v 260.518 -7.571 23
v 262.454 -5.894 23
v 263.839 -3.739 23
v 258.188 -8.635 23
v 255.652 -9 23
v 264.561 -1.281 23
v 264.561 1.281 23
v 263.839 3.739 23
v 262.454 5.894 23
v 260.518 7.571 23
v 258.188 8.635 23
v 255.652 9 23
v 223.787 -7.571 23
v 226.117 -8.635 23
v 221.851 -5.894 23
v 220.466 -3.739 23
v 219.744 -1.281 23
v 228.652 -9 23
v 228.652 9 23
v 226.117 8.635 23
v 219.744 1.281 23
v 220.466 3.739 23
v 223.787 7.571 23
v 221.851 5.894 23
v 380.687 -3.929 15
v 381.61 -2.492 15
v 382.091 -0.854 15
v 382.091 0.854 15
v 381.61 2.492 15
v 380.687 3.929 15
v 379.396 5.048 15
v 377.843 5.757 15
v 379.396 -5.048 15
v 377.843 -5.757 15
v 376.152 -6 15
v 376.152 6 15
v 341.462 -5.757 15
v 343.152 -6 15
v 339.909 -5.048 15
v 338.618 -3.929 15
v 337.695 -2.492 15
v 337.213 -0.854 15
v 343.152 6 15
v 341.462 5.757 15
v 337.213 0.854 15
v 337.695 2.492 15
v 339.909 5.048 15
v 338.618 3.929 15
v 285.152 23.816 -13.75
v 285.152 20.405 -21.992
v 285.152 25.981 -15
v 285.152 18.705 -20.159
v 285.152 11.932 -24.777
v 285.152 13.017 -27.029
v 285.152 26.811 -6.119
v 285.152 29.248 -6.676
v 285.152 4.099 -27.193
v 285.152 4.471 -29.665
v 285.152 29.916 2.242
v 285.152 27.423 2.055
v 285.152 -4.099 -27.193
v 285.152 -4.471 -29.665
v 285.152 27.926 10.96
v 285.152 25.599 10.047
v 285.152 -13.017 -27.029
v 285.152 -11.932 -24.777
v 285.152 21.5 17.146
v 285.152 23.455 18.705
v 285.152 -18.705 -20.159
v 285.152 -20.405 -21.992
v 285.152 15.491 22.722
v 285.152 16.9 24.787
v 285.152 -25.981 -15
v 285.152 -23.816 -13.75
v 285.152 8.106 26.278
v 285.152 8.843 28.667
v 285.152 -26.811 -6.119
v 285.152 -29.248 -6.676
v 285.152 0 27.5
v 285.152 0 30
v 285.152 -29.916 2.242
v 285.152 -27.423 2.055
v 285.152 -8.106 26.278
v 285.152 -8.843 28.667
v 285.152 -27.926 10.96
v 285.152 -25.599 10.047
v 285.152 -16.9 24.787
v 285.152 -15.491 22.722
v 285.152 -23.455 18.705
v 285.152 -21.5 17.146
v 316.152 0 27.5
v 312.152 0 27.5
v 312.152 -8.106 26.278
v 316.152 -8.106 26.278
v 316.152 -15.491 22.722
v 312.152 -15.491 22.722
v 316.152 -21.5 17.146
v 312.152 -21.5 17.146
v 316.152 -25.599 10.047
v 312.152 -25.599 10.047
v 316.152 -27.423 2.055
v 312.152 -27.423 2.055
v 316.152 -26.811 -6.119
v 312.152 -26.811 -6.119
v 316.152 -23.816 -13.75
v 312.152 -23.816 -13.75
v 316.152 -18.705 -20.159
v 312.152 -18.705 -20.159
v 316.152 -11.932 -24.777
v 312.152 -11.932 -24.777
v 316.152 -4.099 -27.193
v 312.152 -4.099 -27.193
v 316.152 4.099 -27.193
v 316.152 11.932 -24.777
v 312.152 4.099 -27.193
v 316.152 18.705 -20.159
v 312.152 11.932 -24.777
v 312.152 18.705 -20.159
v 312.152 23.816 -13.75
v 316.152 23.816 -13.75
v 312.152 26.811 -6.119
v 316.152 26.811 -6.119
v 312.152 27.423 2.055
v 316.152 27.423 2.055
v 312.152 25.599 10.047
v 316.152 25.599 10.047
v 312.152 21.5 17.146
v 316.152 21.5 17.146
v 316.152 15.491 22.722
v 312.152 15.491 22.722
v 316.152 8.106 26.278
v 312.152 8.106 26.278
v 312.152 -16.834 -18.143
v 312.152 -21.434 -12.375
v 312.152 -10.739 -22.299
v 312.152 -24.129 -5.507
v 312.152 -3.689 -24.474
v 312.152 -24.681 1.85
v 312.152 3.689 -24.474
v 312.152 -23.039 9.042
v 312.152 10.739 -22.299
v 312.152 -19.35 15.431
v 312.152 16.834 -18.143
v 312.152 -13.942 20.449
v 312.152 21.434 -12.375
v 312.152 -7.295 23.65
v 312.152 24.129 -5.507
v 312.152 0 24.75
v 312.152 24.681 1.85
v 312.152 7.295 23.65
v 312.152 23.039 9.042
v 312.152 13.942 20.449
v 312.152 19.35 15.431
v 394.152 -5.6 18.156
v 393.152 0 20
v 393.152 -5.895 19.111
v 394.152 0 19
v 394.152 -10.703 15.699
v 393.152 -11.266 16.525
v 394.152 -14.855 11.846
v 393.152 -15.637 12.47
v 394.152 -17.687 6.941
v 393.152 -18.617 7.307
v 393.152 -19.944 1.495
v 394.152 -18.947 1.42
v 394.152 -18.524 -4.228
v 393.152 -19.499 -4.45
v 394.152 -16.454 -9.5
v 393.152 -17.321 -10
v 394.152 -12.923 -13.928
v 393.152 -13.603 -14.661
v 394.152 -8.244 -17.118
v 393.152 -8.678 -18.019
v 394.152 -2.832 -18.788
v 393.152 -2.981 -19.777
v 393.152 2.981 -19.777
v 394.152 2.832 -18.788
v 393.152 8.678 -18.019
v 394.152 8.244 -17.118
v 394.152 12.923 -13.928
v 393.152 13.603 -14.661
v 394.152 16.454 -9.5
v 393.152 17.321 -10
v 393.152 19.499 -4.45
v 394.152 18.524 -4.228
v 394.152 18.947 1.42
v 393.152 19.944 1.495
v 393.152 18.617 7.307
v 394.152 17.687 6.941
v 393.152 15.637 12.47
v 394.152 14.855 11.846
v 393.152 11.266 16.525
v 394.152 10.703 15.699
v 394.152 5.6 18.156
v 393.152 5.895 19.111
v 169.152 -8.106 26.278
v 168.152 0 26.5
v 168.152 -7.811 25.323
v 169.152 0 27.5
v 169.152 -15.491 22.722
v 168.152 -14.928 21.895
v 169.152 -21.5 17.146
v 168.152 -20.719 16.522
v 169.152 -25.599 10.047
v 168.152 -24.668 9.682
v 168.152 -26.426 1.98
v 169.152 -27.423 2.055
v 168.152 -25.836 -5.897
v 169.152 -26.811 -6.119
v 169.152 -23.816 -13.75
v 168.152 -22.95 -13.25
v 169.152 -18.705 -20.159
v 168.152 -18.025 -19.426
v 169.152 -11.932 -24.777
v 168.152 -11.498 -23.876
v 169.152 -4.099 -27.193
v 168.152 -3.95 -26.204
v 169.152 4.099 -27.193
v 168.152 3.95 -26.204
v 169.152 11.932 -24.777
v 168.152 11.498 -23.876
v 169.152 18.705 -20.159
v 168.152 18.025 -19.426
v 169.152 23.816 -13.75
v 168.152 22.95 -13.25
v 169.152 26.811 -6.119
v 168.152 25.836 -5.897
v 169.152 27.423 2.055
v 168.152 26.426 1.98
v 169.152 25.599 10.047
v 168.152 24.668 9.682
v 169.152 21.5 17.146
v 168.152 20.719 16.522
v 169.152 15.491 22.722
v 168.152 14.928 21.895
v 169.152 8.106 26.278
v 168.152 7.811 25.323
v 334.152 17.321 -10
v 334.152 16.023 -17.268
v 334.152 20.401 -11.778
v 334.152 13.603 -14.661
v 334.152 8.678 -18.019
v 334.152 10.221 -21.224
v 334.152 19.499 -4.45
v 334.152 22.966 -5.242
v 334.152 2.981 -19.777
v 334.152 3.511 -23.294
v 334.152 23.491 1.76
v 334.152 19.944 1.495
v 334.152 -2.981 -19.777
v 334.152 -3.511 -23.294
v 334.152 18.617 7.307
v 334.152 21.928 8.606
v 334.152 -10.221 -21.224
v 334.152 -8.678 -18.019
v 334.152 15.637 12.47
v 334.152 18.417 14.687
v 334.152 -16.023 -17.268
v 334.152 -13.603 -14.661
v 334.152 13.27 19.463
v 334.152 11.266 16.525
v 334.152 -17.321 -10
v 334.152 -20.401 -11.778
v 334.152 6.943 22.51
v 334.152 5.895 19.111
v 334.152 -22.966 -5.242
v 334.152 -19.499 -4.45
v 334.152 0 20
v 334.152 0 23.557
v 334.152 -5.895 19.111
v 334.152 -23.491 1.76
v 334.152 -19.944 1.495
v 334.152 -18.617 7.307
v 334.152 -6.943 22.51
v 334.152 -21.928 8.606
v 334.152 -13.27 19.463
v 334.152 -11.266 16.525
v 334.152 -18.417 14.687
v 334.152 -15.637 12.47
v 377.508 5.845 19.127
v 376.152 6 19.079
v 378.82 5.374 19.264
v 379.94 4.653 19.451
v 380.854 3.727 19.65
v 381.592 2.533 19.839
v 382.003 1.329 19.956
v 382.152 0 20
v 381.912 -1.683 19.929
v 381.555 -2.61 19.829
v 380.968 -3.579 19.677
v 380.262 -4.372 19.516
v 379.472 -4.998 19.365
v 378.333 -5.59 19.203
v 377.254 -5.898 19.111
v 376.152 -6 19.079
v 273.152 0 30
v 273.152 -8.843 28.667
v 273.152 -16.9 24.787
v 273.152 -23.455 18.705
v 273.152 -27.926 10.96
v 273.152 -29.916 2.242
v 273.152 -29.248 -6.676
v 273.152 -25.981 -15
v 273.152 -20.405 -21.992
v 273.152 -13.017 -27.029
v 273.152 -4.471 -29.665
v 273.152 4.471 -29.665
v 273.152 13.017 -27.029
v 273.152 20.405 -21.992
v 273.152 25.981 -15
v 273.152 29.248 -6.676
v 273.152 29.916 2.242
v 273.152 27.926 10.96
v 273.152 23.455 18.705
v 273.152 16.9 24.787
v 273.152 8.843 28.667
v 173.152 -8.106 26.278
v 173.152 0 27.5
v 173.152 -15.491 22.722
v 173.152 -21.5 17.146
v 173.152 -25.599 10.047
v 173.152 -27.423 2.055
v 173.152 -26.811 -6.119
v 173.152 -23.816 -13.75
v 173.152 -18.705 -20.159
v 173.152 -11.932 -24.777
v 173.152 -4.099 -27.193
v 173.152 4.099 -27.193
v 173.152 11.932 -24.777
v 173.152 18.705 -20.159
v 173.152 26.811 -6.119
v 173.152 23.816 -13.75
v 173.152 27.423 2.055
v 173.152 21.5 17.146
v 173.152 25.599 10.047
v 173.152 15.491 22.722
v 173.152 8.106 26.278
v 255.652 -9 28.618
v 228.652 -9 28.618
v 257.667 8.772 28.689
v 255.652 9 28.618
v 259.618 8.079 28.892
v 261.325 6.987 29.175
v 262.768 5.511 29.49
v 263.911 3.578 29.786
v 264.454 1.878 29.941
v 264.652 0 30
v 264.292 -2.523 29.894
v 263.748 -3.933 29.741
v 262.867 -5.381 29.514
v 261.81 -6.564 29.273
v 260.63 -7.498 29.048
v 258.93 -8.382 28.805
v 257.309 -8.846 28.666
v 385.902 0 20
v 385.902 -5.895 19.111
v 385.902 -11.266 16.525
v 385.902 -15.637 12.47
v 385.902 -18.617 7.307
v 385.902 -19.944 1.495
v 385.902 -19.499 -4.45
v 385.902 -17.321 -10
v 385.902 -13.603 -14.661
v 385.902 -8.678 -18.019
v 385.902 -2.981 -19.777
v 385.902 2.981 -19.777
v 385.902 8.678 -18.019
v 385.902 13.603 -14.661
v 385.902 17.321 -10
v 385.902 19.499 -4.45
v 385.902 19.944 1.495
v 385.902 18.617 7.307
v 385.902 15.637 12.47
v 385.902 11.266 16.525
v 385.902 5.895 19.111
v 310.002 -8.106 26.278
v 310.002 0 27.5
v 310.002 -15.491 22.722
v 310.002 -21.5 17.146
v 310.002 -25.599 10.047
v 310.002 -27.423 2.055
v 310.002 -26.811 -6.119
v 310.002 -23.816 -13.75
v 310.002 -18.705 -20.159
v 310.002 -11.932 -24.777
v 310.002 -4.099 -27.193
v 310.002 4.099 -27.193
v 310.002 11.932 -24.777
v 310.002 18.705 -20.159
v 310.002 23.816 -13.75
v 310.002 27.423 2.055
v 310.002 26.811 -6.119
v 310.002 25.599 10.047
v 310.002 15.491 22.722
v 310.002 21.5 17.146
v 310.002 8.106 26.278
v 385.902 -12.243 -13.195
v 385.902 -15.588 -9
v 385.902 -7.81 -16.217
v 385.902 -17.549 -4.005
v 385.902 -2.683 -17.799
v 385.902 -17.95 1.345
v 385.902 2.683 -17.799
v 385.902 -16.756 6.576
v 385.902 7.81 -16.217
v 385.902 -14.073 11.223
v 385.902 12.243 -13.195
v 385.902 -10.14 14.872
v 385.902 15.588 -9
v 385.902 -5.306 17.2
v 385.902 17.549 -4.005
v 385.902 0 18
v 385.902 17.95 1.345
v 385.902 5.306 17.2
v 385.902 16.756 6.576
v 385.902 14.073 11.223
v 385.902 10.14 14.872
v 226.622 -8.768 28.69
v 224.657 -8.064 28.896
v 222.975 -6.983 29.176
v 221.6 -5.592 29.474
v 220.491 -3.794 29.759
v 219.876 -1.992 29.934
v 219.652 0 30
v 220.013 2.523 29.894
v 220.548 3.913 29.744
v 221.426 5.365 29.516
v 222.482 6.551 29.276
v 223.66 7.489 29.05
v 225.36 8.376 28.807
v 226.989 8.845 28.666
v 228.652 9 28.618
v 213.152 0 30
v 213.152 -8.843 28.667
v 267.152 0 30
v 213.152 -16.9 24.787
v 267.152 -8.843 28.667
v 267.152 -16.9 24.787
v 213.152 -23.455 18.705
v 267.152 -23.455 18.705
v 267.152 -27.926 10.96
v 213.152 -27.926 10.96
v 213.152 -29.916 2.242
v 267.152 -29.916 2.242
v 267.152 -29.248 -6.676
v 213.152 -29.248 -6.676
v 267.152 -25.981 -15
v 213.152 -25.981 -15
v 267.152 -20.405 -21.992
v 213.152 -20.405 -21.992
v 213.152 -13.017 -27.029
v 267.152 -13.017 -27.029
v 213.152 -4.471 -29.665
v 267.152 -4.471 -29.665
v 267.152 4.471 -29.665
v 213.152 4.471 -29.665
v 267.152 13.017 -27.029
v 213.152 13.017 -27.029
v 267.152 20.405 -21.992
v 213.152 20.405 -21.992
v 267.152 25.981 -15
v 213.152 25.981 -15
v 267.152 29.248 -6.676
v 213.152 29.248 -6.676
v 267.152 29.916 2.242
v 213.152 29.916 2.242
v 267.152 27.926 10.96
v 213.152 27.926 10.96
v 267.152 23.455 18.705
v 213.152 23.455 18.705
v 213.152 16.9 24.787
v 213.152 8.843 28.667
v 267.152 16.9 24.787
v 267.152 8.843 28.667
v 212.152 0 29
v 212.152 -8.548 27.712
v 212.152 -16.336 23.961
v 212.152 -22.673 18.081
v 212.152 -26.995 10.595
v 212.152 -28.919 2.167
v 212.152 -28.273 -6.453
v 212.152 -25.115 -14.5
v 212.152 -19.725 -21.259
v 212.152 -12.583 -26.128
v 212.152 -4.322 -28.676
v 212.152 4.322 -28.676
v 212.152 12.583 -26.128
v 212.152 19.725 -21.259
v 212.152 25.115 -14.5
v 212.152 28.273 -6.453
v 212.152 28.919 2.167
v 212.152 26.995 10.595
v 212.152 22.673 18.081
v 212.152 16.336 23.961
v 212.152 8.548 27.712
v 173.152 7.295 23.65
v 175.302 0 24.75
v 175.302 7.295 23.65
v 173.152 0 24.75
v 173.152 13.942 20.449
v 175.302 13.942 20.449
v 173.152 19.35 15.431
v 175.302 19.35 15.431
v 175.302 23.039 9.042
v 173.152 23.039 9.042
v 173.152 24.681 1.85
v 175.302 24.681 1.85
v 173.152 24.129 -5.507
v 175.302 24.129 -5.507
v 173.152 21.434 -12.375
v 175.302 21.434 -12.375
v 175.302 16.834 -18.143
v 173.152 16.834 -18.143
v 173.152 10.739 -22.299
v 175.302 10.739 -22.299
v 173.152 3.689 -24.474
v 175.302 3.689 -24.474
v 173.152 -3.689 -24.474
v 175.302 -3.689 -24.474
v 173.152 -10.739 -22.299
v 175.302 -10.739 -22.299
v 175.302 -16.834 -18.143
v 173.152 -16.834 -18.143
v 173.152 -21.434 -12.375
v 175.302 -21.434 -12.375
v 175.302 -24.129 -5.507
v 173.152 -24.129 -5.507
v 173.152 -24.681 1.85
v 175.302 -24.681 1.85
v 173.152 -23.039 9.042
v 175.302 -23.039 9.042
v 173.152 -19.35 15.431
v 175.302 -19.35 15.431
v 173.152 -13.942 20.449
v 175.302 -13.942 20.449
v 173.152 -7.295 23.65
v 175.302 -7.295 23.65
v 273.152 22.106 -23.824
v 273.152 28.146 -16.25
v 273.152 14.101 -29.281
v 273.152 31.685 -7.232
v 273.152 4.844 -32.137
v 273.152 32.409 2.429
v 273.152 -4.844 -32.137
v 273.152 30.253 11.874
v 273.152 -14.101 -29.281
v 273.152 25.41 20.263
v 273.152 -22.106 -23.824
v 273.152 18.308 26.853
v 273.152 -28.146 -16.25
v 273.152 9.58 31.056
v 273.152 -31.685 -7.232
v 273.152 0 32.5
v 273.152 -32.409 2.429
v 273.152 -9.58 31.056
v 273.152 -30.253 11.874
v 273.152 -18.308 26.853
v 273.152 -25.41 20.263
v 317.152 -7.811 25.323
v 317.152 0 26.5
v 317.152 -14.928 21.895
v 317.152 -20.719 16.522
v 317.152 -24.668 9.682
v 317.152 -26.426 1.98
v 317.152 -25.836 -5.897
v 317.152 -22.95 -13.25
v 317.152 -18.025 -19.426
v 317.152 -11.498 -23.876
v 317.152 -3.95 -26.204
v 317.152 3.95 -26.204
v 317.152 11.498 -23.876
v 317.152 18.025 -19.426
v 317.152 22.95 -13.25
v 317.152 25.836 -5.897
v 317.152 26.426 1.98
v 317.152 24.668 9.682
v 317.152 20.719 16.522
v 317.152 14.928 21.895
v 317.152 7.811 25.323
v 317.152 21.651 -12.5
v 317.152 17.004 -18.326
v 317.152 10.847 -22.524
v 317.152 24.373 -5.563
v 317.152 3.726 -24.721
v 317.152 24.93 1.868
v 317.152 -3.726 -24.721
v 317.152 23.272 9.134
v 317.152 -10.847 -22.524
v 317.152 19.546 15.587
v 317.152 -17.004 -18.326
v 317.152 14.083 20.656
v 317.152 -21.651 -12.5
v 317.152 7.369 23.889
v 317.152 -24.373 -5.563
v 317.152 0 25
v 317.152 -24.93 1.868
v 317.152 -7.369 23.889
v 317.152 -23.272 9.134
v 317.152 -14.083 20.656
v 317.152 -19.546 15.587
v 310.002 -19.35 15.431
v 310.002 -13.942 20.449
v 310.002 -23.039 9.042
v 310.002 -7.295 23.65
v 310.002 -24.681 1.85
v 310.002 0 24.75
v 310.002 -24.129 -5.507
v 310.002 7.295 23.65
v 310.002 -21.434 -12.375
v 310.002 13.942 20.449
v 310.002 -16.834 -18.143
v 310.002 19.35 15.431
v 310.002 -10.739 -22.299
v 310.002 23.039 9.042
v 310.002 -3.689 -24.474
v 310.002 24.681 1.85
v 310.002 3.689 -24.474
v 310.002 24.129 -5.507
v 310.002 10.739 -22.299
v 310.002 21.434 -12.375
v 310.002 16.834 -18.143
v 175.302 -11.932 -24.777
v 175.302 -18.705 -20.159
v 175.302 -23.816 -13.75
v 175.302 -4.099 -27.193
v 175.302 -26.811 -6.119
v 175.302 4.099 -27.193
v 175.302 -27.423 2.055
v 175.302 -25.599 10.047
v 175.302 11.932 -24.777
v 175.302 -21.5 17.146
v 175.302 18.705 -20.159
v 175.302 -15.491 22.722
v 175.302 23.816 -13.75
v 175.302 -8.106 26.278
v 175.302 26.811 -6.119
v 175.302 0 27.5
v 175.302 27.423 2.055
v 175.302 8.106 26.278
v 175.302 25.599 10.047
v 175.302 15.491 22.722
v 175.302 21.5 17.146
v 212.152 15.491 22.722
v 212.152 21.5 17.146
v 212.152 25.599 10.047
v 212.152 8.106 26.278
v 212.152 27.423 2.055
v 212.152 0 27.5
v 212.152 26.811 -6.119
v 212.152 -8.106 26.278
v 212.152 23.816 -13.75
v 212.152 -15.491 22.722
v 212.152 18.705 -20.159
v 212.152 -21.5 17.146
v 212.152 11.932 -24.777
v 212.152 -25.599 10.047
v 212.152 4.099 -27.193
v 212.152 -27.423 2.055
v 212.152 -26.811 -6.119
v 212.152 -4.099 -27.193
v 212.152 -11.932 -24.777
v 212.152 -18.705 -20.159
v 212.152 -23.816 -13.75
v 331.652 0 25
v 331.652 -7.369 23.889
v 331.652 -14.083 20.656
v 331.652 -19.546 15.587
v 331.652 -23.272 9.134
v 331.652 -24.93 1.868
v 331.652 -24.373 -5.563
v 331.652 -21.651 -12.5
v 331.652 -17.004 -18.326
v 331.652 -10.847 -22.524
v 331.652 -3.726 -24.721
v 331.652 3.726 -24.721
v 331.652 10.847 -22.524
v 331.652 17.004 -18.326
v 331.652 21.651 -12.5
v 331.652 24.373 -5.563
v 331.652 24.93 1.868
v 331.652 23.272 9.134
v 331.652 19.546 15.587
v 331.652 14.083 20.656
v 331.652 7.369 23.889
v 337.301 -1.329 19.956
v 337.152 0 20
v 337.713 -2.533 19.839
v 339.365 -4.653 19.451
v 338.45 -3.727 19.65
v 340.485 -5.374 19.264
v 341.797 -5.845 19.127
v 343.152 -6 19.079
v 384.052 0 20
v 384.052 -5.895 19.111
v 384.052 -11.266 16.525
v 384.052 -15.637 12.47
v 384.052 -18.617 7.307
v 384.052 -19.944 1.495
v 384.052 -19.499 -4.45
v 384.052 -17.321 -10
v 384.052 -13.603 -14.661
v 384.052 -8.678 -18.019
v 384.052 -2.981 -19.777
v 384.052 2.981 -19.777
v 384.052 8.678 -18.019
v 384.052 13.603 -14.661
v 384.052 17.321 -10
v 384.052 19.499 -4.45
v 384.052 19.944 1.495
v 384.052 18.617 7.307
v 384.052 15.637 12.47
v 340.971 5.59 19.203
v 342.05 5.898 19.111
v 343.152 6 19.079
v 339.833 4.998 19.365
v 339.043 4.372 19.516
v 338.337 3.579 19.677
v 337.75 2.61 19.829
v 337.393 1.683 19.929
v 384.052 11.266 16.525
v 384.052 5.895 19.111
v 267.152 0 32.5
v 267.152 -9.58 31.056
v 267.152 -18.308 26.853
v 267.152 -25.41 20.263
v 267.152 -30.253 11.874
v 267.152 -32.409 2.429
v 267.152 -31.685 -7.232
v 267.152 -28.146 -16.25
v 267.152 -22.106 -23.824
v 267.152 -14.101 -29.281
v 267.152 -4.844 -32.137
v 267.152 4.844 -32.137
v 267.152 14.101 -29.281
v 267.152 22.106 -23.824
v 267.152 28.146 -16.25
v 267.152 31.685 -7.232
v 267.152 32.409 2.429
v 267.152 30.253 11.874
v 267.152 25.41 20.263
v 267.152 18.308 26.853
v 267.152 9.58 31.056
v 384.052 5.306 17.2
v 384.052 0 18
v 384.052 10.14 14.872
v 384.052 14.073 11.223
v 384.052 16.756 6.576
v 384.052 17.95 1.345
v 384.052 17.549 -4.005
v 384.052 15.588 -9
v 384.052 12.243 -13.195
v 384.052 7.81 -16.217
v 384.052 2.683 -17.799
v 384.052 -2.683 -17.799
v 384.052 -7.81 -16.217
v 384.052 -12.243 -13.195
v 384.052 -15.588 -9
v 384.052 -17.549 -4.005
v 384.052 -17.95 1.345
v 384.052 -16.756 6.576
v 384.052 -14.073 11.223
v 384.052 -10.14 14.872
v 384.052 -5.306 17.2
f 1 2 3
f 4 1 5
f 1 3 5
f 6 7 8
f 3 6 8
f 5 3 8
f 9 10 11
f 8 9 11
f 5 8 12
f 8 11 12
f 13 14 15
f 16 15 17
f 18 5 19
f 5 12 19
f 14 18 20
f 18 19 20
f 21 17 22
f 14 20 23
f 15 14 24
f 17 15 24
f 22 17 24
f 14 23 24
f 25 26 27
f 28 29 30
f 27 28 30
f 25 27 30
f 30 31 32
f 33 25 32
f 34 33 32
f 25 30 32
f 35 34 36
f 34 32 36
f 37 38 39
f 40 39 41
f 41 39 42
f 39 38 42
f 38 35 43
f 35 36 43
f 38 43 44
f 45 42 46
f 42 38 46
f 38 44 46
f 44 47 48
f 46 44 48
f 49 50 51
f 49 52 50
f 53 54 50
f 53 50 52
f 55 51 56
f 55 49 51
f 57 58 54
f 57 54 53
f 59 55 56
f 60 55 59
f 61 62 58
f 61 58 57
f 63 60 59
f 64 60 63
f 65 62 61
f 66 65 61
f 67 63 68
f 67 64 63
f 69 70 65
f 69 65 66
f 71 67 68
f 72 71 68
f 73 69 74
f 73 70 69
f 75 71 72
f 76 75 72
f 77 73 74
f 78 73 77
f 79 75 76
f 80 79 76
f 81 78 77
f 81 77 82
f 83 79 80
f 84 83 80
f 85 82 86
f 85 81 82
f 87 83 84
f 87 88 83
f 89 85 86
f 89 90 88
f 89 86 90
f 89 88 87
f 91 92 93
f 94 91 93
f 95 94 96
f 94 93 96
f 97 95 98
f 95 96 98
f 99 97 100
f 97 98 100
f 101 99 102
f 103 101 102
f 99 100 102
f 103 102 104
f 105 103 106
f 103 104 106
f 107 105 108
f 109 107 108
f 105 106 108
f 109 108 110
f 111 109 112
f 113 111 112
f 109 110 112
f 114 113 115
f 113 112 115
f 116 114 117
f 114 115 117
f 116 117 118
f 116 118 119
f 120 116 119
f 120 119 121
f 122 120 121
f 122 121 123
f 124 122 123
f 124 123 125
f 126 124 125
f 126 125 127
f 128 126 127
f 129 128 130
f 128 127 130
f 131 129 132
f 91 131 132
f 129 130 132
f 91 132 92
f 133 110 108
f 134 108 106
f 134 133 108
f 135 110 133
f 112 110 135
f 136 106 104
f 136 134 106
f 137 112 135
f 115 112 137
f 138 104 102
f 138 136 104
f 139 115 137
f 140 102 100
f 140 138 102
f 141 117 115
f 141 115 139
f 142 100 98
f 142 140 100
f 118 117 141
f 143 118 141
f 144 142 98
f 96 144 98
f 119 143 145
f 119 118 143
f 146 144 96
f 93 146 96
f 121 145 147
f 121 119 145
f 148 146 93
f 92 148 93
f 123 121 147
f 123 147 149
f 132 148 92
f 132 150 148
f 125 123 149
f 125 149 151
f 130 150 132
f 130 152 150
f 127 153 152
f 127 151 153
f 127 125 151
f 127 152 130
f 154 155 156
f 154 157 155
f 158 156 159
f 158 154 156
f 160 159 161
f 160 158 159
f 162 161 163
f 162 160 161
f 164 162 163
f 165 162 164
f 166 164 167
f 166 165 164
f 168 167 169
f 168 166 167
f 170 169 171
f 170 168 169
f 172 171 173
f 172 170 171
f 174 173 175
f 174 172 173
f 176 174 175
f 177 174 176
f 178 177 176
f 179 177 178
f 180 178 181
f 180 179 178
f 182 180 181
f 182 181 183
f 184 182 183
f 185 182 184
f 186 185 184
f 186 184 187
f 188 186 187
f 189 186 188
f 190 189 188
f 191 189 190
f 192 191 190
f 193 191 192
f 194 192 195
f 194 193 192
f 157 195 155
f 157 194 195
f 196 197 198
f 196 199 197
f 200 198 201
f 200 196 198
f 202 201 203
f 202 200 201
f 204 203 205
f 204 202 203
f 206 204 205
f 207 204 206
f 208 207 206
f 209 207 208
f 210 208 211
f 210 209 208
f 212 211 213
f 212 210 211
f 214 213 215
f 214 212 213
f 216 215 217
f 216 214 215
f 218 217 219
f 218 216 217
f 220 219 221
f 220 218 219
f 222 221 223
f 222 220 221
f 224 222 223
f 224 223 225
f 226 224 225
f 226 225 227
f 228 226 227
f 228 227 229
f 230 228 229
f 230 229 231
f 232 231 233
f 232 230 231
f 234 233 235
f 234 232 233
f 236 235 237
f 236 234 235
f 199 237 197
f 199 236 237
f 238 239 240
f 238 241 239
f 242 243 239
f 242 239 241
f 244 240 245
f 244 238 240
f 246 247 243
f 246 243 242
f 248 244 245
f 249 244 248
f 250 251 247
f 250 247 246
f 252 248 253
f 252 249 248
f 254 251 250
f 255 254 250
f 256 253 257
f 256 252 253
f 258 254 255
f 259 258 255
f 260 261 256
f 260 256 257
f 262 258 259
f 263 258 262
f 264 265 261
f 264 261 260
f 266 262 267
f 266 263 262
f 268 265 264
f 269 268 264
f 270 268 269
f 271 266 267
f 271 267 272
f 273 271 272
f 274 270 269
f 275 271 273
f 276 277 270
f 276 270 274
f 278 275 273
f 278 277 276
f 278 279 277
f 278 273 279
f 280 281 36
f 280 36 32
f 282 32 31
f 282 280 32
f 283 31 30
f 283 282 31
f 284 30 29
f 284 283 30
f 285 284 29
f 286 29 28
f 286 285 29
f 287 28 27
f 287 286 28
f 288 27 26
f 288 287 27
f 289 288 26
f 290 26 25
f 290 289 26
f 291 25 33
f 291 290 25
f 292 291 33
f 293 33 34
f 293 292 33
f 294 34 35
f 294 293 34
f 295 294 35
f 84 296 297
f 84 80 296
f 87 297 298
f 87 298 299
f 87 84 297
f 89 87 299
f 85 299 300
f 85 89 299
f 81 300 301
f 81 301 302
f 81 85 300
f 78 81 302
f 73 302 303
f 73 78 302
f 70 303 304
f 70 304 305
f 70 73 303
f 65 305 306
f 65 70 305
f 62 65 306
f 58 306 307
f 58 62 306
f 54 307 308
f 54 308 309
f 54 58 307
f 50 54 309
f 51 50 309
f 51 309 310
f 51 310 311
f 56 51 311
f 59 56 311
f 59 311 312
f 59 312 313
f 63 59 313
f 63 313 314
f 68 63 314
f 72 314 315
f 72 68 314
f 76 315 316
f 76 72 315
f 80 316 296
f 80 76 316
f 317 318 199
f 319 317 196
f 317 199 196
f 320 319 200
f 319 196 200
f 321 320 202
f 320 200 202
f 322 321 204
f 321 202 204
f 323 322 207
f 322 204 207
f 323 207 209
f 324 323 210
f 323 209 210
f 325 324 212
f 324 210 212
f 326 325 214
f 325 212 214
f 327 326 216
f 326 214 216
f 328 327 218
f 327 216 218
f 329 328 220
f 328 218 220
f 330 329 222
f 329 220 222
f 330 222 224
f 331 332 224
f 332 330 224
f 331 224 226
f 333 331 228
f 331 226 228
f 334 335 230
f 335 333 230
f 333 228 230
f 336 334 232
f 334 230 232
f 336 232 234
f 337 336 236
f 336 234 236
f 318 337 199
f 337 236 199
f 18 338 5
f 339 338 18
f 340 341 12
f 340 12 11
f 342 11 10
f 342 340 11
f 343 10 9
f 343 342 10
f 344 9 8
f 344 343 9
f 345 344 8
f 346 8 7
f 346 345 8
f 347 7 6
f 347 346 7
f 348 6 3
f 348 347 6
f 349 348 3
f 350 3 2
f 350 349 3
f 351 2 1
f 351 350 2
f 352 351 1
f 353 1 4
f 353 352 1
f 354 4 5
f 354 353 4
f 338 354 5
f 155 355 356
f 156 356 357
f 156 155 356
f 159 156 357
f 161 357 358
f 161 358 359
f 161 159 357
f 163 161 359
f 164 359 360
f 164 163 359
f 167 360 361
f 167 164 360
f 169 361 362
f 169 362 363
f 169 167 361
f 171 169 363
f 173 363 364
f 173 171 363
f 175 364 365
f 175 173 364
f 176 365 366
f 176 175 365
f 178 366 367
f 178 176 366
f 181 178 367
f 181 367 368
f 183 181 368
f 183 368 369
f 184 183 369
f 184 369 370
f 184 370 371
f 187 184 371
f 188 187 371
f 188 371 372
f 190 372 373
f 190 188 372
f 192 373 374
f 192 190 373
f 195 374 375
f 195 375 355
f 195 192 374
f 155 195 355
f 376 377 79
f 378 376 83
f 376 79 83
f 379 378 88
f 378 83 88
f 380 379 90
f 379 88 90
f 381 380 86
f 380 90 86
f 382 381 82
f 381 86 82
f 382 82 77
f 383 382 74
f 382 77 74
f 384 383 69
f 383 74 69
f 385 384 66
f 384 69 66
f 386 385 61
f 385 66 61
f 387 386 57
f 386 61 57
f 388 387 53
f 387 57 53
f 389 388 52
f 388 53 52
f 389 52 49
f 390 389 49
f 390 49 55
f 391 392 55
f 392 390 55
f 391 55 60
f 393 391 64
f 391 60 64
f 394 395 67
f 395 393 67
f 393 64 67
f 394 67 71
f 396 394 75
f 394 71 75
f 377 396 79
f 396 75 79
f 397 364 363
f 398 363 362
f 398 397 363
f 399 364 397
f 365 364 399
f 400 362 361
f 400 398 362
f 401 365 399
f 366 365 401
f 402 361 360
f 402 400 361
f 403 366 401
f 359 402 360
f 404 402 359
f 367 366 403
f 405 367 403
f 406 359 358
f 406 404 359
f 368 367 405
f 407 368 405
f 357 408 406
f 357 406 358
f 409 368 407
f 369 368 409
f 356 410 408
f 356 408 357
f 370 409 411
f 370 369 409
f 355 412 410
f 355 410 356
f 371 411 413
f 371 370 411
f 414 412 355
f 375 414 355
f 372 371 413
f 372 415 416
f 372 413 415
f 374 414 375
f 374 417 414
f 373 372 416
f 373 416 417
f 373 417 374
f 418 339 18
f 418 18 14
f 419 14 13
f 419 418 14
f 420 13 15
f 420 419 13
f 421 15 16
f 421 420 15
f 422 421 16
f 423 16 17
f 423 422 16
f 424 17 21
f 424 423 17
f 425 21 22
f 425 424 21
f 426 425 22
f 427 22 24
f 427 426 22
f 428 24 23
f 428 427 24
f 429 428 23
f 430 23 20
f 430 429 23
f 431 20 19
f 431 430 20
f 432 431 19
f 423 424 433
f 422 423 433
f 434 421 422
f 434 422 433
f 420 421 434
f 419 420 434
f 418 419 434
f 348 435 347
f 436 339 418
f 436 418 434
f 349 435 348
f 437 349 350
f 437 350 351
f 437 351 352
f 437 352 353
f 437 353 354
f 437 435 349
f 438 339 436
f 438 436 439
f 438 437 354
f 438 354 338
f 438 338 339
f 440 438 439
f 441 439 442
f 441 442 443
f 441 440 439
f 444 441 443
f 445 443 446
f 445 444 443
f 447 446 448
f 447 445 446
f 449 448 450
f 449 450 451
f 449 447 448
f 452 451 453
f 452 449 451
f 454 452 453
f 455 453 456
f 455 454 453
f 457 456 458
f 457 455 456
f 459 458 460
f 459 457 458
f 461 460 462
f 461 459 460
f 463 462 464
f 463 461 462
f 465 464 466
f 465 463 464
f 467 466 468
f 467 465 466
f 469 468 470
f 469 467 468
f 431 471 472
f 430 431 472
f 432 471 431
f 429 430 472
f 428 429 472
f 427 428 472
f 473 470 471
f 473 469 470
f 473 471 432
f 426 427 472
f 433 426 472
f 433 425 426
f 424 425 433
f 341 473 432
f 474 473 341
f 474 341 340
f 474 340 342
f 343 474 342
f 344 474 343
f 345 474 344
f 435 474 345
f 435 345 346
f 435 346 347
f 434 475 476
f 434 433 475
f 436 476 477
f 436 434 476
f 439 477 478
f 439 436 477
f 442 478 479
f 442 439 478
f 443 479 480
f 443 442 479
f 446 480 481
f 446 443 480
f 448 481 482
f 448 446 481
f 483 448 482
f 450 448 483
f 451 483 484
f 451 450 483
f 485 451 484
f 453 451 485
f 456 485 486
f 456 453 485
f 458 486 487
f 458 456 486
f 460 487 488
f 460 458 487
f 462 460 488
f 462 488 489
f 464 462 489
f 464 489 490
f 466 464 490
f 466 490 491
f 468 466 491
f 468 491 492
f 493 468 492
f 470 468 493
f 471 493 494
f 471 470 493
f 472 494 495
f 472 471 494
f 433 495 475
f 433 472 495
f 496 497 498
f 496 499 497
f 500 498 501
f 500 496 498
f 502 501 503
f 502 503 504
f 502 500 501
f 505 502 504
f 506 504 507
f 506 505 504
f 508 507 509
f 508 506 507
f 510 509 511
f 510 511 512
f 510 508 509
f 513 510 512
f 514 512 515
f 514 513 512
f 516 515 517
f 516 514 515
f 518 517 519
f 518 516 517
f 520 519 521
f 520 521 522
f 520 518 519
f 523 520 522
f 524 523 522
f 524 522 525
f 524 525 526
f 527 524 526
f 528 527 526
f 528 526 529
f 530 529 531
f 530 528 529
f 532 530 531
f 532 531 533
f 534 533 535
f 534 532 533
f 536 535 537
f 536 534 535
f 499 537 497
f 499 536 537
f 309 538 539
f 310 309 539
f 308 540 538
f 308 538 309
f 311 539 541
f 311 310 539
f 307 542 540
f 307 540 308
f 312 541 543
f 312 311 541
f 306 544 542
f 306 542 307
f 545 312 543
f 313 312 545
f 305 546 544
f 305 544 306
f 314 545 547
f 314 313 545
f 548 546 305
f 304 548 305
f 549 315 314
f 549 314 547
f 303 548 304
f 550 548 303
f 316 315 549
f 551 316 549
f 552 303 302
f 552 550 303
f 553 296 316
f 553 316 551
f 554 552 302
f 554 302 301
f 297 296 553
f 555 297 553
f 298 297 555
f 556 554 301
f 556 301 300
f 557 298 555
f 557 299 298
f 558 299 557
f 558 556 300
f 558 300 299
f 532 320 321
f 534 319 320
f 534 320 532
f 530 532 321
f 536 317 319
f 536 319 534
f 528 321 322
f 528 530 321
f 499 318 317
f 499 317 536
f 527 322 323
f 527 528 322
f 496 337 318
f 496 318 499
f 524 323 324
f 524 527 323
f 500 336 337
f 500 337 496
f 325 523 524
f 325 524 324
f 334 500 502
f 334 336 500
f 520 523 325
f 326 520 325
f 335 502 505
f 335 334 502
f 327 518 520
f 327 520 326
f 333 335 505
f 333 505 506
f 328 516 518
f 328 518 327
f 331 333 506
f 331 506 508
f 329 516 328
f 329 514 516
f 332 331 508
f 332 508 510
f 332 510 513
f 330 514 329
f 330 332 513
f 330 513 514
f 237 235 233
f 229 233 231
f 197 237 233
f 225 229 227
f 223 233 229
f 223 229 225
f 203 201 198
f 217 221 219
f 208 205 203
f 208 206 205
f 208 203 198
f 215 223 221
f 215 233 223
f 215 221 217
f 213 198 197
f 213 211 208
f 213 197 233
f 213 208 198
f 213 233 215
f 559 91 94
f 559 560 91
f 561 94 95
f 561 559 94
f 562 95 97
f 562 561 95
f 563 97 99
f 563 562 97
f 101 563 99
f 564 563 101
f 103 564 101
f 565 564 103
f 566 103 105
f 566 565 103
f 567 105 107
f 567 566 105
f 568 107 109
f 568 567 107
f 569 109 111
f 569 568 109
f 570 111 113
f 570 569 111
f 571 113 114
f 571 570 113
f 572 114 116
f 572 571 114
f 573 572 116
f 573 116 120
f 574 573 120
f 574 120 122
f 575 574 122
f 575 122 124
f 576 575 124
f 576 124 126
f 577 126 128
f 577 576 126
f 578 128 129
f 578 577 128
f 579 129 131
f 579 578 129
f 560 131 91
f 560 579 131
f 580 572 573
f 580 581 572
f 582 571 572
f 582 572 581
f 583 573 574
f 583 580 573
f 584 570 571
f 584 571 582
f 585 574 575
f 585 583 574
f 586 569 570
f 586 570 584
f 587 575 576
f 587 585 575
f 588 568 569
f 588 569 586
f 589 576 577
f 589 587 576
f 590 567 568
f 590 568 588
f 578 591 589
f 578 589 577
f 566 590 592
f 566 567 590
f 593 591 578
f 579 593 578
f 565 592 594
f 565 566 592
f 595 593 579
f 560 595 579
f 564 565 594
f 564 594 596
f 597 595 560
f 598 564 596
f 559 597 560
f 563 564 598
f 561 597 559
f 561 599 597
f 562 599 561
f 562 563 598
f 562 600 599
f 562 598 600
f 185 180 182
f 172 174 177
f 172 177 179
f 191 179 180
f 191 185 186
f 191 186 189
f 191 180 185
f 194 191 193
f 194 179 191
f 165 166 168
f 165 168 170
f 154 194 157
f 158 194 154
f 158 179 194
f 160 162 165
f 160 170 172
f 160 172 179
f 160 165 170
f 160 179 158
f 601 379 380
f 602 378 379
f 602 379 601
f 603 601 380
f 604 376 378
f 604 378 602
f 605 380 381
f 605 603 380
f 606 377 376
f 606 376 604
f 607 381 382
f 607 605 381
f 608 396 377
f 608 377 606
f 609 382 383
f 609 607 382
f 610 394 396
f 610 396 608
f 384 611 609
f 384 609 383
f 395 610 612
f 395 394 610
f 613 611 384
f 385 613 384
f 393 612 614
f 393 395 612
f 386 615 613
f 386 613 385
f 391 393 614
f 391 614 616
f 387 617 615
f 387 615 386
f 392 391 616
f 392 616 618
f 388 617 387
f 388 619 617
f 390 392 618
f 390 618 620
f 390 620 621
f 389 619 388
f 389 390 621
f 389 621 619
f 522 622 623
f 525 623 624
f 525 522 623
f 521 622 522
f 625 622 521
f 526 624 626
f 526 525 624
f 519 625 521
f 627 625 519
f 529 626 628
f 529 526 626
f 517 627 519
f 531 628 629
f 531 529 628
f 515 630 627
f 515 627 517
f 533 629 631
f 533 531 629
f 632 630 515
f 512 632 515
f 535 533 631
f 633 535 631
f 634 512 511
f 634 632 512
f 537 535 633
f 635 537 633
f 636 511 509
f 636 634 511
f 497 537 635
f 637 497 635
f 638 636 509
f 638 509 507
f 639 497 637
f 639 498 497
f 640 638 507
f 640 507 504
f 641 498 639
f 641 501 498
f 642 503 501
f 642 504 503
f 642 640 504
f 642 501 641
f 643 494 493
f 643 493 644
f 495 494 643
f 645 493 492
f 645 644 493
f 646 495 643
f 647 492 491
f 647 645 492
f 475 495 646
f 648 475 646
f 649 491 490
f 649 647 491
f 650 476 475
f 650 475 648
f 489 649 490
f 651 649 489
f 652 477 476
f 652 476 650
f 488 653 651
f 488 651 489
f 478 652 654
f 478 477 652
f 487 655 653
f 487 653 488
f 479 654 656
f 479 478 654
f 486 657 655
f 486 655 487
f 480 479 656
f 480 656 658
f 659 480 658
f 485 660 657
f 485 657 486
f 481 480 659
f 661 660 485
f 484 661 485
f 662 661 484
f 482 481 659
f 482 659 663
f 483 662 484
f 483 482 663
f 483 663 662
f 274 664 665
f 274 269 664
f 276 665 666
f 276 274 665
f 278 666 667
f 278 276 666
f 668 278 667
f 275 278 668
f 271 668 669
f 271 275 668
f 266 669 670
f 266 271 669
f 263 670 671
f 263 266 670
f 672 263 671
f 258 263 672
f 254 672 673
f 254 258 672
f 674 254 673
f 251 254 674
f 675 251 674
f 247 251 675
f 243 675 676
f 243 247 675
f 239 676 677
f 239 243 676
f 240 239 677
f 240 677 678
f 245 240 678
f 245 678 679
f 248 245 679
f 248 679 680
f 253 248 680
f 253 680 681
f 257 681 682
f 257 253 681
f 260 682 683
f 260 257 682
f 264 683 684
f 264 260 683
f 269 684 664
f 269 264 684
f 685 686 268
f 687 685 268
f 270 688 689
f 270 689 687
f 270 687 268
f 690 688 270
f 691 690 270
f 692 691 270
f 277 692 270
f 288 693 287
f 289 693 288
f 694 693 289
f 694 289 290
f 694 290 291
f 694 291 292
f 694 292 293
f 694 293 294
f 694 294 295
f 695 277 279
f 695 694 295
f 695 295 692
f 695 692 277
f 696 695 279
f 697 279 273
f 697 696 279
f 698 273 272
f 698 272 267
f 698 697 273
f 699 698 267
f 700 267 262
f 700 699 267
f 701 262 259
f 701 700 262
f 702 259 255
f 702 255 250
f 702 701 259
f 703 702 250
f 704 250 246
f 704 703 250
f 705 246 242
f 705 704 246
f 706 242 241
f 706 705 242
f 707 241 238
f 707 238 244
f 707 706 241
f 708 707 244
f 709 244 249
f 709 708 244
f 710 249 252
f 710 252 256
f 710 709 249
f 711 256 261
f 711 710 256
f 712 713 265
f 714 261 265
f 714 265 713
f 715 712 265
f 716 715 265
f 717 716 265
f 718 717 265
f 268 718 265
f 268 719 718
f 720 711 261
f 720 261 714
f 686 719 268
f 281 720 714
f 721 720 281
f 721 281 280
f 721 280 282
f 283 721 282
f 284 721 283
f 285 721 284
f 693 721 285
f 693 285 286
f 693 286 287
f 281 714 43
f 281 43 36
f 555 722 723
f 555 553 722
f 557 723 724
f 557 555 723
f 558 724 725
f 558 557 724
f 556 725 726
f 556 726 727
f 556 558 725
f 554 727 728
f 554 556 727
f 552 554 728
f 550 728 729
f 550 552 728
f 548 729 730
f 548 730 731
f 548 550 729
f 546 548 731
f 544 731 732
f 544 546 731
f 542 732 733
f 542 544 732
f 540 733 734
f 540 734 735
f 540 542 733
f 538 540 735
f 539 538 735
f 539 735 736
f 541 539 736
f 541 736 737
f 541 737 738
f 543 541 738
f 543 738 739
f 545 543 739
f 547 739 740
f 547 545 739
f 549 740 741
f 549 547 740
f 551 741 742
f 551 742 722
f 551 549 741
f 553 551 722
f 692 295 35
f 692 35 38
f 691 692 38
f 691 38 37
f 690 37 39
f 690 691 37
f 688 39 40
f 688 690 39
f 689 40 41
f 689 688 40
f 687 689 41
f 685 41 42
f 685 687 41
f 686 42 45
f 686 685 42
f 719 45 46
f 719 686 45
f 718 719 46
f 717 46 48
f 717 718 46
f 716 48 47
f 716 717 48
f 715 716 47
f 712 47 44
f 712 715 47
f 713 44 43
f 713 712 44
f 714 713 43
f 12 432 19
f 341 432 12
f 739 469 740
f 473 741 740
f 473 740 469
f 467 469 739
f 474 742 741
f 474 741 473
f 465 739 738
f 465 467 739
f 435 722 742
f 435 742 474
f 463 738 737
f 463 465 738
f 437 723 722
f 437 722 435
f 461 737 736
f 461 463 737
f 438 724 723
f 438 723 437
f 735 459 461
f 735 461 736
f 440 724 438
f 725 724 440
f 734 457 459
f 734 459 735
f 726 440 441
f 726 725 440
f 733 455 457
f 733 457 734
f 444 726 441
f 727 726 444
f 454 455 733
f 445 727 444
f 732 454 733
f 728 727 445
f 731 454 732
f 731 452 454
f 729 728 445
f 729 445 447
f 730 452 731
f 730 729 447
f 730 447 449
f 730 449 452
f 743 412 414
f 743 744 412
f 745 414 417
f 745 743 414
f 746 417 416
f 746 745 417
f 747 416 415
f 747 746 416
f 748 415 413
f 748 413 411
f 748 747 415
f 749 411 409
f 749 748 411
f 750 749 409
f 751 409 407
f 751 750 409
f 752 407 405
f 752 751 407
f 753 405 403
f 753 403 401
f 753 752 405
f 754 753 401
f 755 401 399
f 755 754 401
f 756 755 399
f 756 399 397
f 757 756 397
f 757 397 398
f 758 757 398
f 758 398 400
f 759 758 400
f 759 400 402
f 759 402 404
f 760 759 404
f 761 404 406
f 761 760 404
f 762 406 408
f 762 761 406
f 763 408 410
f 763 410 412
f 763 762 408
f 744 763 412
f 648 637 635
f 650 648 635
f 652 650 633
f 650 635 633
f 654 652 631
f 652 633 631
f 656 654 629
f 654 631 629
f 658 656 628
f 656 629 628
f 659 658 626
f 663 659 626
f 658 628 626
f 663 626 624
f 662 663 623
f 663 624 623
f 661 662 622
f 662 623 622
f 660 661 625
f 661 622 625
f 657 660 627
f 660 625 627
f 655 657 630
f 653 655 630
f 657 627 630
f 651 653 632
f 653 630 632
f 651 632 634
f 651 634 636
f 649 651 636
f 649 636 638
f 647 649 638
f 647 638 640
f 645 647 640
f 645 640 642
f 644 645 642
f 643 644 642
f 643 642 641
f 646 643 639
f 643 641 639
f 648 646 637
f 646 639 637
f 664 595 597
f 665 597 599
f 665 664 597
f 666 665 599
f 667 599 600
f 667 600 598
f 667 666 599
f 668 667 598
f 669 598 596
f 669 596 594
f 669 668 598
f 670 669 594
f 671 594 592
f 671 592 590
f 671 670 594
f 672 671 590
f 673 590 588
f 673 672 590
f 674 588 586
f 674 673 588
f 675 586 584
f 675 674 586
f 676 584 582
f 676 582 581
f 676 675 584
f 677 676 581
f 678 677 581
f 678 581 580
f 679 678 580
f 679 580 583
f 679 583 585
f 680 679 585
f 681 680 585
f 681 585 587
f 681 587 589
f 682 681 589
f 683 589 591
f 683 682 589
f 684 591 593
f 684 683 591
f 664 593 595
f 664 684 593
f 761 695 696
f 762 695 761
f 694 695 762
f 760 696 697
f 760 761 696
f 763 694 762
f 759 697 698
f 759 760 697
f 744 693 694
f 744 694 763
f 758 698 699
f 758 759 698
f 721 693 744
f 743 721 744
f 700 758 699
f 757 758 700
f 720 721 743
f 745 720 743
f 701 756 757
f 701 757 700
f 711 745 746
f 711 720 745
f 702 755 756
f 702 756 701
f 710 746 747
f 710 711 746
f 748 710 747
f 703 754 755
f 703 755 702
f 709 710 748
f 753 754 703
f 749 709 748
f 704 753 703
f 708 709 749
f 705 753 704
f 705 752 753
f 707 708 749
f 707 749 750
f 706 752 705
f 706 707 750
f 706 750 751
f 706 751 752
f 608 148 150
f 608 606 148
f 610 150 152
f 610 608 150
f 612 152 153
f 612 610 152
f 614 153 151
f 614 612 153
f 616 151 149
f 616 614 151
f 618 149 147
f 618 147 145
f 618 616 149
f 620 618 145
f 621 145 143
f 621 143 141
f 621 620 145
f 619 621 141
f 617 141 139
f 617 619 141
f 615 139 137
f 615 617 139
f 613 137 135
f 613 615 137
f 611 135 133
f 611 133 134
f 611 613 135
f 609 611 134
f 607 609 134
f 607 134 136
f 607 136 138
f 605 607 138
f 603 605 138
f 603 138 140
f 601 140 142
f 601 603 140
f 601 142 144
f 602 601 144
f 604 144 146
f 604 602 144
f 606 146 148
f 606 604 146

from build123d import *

# Parameters (mm, degrees)
SCHNITT_LINEAR_AUSTRAGEN1_DEPTH = 7
SCHNITT_LINEAR_AUSTRAGEN2_DEPTH = 5


with BuildPart() as part:
    # Skizze1 → Rotation17 (revolve)
    with BuildSketch(Plane.XY, mode=Mode.PRIVATE) as rotation17_sk:
        Polygon((168.152402442, 0), (168.152402442, 26.5), (169.152402442, 27.5), (184.152402442, 27.5), (212.152402442, 27.5), (212.152402442, 29), (213.152402442, 30), (267.152402442, 30), (267.152402442, 32.5), (273.152402442, 32.5), (273.152402442, 30), (285.152402442, 30), (285.152402442, 27.5), (297.652402442, 27.5), (316.152402442, 27.5), (317.152402442, 26.5), (317.152402442, 25), (331.652402442, 25), (334.152402442, 23.556624327), (334.152402442, 20), (393.152402442, 20), (394.152402442, 19), (394.152402442, 0), align=None)
    revolve(rotation17_sk.sketch.rotate(Axis((168.152402442, 0, 0), (1, 0, 0)), 90), axis=Axis((168.152402442, 0, 0), (1, 0, 0)))  # turned: the seam where the file's is

    # Skizze3 → Schnitt-Linear austragen1 (cut)
    with BuildSketch(Plane.XY.offset(30)):
        with BuildLine():
            Line((228.652402442, 9), (255.652402442, 9))
            ThreePointArc((255.652402442, 9), (264.652402442, 0), (255.652402442, -9))
            Line((255.652402442, -9), (228.652402442, -9))
            ThreePointArc((228.652402442, -9), (219.652402442, 0), (228.652402442, 9))
        make_face()
    extrude(amount=-SCHNITT_LINEAR_AUSTRAGEN1_DEPTH, mode=Mode.SUBTRACT)

    # Skizze4 → Schnitt-Linear austragen2 (cut)
    with BuildSketch(Plane.XY.offset(20)):
        with BuildLine():
            Line((343.152402442, 6), (376.152402442, 6))
            ThreePointArc((376.152402442, 6), (382.152402442, 0), (376.152402442, -6))
            Line((376.152402442, -6), (343.152402442, -6))
            ThreePointArc((343.152402442, -6), (337.152402442, 0), (343.152402442, 6))
        make_face()
    extrude(amount=-SCHNITT_LINEAR_AUSTRAGEN2_DEPTH, mode=Mode.SUBTRACT)

    # Skizze16 → Nut f_r DIN 472 - 55 x 2_ Sicherungsring (revolve, cut)
    with BuildSketch(Plane(origin=(168.152402442, 0, 0), x_dir=(0, 0, 1), z_dir=(0, -1, 0))):
        with BuildLine():
            Line((28.785, -7.15), (24.75, -7.15))
            Line((24.75, -7.15), (24.75, -5))
            Line((24.75, -5), (28.785, -5))
            ThreePointArc((28.785, -5), (28.937027958, -5.062972042), (29, -5.215))
            Line((29, -5.215), (29, -6.935))
            ThreePointArc((29, -6.935), (28.937027958, -7.087027958), (28.785, -7.15))
        make_face()
    revolve(axis=Axis((218.152402442, 0, 0), (-1, 0, 0)), mode=Mode.SUBTRACT)

    # Skizze18 → Nut für DIN 472 - 40 x 1.75, Sicherungsring für Bohrungen - Regelausf.1 (revolve, cut)
    with BuildSketch(Plane(origin=(168.152402442, 0, 0), x_dir=(0, 0, 1), z_dir=(0, -1, 0))):
        with BuildLine():
            Line((21.065, -217.75), (18, -217.75))
            Line((18, -217.75), (18, -215.9))
            Line((18, -215.9), (21.065, -215.9))
            ThreePointArc((21.065, -215.9), (21.195814755, -215.954185245), (21.25, -216.085))
            Line((21.25, -216.085), (21.25, -217.565))
            ThreePointArc((21.25, -217.565), (21.195814755, -217.695814755), (21.065, -217.75))
        make_face()
    revolve(axis=Axis((218.152402442, 0, 0), (-1, 0, 0)), mode=Mode.SUBTRACT)

    # Skizze20 → Nut f_r DIN 472 - 55 x 2_ Sicherungs 2 (revolve, cut)
    with BuildSketch(Plane(origin=(168.152402442, 0, 0), x_dir=(0, 0, 1), z_dir=(0, -1, 0))):
        with BuildLine():
            Line((28.785, -144), (24.75, -144))
            Line((24.75, -144), (24.75, -141.85))
            Line((24.75, -141.85), (28.785, -141.85))
            ThreePointArc((28.785, -141.85), (28.937027958, -141.912972042), (29, -142.065))
            Line((29, -142.065), (29, -143.785))
            ThreePointArc((29, -143.785), (28.937027958, -143.937027958), (28.785, -144))
        make_face()
    revolve(axis=Axis((218.152402442, 0, 0), (-1, 0, 0)), mode=Mode.SUBTRACT)


solid = part.part
